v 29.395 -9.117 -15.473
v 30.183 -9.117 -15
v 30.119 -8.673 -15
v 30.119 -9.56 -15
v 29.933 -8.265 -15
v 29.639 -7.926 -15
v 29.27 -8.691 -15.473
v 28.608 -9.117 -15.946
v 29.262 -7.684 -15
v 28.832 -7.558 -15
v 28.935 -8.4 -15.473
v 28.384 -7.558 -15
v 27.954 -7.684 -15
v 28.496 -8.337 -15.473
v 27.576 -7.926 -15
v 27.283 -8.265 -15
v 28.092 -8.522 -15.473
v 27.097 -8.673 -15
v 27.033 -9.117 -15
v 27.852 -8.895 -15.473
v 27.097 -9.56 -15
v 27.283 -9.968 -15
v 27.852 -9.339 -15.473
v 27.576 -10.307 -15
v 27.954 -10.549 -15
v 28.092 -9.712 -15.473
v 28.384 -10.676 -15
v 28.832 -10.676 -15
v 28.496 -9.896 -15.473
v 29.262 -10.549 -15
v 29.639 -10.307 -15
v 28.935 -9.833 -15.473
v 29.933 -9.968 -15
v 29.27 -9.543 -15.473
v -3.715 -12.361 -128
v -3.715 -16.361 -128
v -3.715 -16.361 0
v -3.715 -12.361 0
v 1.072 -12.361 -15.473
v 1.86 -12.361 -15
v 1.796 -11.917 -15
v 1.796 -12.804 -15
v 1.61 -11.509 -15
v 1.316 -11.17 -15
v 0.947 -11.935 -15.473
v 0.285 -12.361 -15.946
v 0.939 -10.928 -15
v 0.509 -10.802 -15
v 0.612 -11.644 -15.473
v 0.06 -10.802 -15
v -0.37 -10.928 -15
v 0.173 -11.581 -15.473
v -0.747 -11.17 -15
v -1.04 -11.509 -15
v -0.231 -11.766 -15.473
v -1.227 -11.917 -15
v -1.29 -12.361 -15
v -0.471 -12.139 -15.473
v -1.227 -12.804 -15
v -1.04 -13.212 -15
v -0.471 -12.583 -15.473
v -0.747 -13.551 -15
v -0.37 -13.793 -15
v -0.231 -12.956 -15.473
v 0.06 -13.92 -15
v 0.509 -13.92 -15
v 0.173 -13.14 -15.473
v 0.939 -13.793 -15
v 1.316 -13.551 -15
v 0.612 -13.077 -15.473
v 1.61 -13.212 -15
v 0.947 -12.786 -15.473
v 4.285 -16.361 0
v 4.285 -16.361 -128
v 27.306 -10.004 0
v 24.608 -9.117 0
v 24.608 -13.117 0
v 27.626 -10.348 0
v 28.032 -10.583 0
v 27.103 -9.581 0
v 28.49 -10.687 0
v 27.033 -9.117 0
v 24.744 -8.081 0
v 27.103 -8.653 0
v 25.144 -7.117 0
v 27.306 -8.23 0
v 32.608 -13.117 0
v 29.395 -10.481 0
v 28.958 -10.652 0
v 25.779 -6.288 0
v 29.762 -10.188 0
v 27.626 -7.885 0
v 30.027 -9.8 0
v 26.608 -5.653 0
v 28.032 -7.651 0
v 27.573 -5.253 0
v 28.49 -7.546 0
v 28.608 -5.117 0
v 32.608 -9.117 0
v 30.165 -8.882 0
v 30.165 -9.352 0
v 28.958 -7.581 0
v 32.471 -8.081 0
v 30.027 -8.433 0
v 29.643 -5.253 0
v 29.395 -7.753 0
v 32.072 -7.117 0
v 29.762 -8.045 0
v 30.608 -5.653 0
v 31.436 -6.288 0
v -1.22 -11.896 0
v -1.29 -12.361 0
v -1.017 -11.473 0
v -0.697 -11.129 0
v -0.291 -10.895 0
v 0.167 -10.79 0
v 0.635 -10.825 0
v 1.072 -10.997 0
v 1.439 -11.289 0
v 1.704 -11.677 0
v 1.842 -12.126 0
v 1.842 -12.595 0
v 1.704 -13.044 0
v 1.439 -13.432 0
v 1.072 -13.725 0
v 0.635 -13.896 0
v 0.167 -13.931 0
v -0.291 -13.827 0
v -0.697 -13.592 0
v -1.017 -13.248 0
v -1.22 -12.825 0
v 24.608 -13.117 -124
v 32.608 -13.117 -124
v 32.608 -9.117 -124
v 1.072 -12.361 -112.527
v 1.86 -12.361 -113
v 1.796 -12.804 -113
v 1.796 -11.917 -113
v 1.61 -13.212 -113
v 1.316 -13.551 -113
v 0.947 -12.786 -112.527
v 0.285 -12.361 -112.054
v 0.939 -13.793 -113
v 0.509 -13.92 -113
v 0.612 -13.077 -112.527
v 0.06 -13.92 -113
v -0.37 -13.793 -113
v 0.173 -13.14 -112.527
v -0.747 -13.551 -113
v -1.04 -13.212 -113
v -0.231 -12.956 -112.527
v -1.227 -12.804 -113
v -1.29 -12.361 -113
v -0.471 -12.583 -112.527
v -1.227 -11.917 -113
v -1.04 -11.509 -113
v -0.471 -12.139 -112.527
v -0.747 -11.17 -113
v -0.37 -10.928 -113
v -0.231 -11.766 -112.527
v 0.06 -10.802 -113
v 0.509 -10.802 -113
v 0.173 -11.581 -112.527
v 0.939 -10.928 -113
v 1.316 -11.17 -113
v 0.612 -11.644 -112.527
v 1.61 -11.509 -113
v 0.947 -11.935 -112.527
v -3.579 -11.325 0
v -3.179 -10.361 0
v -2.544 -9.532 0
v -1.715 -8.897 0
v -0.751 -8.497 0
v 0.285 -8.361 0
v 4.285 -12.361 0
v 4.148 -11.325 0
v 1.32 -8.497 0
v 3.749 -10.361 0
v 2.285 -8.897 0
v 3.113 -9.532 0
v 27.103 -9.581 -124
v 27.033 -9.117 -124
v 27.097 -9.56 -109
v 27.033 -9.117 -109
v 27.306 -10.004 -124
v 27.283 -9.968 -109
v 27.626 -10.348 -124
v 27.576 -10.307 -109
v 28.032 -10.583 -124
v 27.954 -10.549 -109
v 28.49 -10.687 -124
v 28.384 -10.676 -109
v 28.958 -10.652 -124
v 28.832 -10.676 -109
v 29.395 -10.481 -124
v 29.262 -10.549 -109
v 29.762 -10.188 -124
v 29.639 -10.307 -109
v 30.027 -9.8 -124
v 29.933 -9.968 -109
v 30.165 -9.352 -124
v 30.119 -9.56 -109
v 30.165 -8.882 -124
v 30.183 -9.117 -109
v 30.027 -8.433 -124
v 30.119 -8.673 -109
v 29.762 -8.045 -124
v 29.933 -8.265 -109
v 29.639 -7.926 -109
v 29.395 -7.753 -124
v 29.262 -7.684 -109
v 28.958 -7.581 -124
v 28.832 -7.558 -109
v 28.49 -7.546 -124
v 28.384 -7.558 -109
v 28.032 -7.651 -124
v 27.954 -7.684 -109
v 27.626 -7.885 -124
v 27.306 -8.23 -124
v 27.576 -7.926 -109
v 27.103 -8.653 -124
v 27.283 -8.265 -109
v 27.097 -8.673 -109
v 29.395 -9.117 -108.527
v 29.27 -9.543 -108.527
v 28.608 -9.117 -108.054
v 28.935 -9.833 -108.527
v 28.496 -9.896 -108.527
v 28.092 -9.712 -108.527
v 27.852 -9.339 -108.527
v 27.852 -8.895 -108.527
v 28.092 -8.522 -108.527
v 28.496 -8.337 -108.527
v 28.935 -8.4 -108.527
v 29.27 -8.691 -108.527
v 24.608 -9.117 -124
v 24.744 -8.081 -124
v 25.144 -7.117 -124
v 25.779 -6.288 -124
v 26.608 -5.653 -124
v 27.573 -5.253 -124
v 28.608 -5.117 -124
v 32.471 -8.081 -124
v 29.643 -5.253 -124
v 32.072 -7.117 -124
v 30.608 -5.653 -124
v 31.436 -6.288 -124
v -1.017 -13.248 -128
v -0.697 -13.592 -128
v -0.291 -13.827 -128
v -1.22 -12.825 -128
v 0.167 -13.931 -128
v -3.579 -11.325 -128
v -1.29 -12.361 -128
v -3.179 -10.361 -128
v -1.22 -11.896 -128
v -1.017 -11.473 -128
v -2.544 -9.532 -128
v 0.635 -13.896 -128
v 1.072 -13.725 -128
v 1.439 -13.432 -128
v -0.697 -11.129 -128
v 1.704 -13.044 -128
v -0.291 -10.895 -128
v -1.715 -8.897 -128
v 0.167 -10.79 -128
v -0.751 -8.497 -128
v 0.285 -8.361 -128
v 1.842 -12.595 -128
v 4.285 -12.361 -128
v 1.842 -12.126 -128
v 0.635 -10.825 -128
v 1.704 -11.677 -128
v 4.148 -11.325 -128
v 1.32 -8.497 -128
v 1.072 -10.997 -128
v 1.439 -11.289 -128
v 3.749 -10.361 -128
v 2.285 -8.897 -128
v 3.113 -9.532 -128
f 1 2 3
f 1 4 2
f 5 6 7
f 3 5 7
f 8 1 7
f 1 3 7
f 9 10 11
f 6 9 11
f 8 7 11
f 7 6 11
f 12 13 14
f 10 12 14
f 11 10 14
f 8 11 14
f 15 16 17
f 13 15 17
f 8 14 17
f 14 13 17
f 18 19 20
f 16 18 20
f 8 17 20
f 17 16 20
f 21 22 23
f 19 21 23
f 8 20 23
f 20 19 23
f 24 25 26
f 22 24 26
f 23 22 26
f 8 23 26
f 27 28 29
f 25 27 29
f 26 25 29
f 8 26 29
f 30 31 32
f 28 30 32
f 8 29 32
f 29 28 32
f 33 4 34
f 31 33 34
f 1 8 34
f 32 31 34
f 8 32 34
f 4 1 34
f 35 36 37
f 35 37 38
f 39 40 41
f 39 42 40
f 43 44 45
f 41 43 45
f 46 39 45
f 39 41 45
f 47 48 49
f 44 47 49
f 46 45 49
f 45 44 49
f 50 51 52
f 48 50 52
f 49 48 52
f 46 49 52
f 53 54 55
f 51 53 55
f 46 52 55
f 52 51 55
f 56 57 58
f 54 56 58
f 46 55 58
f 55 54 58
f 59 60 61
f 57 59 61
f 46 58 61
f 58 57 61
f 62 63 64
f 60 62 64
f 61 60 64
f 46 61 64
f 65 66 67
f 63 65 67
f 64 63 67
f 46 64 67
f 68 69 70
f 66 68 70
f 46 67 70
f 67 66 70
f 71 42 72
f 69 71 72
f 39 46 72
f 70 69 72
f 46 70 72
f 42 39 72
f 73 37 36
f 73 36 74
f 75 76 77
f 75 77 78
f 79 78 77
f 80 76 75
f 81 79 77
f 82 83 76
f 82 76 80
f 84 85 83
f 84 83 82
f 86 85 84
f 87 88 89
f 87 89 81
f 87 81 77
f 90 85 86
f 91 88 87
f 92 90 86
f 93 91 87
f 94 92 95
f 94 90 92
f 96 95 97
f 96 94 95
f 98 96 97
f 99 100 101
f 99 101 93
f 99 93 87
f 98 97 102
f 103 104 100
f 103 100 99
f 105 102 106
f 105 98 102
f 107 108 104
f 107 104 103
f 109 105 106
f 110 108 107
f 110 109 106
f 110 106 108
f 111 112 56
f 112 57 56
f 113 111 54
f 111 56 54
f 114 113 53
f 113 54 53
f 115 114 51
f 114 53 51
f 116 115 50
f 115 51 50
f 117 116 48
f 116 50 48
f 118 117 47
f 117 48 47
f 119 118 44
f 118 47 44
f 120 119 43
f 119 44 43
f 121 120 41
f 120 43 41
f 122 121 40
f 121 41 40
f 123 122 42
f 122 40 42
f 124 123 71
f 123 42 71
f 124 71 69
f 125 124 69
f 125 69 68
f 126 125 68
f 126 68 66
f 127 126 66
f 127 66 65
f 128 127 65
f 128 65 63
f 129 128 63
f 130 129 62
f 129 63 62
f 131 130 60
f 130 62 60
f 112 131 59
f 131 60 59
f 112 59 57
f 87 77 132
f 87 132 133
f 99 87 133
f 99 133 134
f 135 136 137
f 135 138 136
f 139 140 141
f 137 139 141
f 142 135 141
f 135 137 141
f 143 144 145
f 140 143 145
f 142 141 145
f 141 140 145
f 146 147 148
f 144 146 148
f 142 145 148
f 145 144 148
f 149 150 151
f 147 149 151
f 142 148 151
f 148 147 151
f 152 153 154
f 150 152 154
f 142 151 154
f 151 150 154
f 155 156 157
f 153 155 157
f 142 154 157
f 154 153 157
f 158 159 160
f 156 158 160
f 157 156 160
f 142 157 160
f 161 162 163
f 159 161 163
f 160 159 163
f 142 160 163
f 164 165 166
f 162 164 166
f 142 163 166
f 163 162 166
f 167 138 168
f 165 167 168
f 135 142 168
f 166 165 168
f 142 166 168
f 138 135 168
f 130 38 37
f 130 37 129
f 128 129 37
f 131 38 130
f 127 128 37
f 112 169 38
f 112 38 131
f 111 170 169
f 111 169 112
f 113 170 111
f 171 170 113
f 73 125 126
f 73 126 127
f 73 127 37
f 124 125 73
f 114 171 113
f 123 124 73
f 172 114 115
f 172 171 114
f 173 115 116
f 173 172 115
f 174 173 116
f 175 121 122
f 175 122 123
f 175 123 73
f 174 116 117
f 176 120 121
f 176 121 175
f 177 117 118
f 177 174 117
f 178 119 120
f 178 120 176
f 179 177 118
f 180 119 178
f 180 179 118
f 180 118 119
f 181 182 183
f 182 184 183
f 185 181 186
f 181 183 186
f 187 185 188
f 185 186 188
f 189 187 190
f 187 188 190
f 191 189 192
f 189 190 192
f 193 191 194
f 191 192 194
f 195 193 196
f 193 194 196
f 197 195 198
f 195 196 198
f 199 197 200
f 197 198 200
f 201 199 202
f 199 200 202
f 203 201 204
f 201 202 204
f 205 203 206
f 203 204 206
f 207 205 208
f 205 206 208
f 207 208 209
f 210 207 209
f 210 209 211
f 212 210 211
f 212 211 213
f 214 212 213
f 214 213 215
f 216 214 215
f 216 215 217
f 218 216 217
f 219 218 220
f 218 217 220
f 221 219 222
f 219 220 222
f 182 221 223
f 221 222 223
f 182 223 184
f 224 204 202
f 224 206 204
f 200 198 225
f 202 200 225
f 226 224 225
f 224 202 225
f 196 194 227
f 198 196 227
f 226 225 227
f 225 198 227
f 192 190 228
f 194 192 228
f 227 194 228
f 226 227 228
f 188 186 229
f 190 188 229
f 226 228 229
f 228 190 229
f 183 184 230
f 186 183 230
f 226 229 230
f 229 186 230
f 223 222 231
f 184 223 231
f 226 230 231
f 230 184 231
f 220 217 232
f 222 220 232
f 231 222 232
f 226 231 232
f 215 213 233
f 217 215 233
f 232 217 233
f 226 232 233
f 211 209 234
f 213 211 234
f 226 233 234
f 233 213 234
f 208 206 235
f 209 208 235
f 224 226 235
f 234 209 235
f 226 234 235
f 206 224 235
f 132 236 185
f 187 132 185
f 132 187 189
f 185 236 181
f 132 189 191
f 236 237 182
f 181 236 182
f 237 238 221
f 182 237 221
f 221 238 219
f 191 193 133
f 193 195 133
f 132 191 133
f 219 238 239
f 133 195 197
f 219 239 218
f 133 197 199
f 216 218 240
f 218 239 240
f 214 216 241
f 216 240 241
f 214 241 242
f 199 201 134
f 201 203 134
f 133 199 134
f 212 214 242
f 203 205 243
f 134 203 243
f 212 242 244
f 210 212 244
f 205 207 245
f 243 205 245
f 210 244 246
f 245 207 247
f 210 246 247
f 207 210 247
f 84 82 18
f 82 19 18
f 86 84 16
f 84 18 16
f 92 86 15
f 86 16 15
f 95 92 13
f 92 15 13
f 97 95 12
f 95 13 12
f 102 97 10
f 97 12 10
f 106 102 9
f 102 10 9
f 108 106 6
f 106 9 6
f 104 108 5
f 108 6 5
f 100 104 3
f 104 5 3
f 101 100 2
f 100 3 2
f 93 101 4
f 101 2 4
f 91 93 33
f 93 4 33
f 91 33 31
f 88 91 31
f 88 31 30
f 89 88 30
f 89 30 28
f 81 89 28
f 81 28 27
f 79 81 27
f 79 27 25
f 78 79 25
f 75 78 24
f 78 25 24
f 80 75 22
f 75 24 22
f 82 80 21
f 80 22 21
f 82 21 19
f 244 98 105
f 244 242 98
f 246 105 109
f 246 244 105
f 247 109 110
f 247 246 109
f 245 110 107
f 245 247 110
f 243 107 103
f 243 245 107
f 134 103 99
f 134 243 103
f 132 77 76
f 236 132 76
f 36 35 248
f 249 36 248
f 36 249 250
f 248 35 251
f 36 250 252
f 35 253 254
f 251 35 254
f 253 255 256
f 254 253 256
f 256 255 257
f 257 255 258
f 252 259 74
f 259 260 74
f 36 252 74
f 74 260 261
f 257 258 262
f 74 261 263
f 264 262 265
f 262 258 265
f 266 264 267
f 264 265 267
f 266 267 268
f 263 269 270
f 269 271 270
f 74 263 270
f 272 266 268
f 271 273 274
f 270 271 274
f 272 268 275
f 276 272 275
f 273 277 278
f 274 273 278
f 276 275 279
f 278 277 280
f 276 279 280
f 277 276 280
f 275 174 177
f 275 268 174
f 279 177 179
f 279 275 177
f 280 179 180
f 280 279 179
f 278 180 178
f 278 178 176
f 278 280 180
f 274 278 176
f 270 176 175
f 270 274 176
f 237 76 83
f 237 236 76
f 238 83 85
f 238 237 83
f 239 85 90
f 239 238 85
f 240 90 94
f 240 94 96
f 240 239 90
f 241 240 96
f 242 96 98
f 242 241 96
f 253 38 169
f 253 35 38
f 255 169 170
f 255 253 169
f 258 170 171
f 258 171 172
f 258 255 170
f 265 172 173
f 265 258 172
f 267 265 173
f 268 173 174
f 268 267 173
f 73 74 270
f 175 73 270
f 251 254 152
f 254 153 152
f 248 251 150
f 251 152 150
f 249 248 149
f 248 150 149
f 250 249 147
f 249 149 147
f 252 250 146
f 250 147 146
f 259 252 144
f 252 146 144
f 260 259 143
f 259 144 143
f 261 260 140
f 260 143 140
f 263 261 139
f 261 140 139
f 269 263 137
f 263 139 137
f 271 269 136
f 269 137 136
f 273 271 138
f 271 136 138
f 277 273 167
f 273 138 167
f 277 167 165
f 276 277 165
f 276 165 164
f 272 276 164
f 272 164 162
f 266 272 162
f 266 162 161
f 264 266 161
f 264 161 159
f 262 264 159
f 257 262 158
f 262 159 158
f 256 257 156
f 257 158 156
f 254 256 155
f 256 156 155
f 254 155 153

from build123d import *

# Parameters (mm, degrees)
F0_W           = 8
F0_H           = 8
F1_DEPTH       = 128
F2_DEPTH       = 124
F5_D           = 3.15
F5_DEPTH       = 15
F5_TIP         = 0.946355475
F5_2_D         = 3.15
F5_2_DEPTH     = 15
F5_2_TIP       = 0.946355475
F5_ON_F3_D     = 3.15
F5_ON_F3_DEPTH = 15
F5_ON_F3_TIP   = 0.946355475
F5_ON_F4_D     = 3.15
F5_ON_F4_DEPTH = 15
F5_ON_F4_TIP   = 0.946355475
F6_R           = 3.99999
F6_2_R         = 3.99999


# Not quite as in the source:
# - a fillet or chamfer is up to 0.001 mm smaller than in the source, because OpenCascade refuses the exact size


with BuildPart() as f1:
    # F0 (on Top) → F1 (new body)
    with BuildSketch(Plane.XY):
        with Locations((0.2846295983, -12.3607183769)):
            Rectangle(F0_W, F0_H)
    extrude(amount=-F1_DEPTH)

    # F5
    with Locations(Plane.XY):
        with Locations((0.2846295983, -12.3607183769), (28.6077857018, -9.1167669743)):
            Hole(F5_D / 2, depth=F5_DEPTH)
            with Locations((0, 0, -(F5_DEPTH + F5_TIP / 2))):  # 118° drill point
                Cone(0, F5_D / 2, F5_TIP, mode=Mode.SUBTRACT)

    # F5 on F3
    with Locations(Plane(origin=(0, 0, -128), x_dir=(1, 0, 0), z_dir=(0, 0, -1))):
        with Locations((0.2846295983, 12.3607183769)):
            Hole(F5_ON_F3_D / 2, depth=F5_ON_F3_DEPTH)
            with Locations((0, 0, -(F5_ON_F3_DEPTH + F5_ON_F3_TIP / 2))):  # 118° drill point
                Cone(0, F5_ON_F3_D / 2, F5_ON_F3_TIP, mode=Mode.SUBTRACT)

    # F6 (radius 4 in the source; OpenCascade refuses exactly that, so slightly less here)
    f6_edges = [f1.edges().sort_by_distance(p)[0] for p in [
        (-3.71537, -8.360718, -64),
        (4.28463, -8.360718, -64),
    ]]
    fillet(f6_edges, radius=F6_R)


with BuildPart() as f2:
    # F0 (on Top) → F2 (new body)
    with BuildSketch(Plane.XY):
        with Locations((28.6077857018, -9.1167669743)):
            Rectangle(F0_W, F0_H)
    extrude(amount=-F2_DEPTH)

    # F5#2
    with Locations(Plane.XY):
        with Locations((0.2846295983, -12.3607183769), (28.6077857018, -9.1167669743)):
            Hole(F5_2_D / 2, depth=F5_2_DEPTH)
            with Locations((0, 0, -(F5_2_DEPTH + F5_2_TIP / 2))):  # 118° drill point
                Cone(0, F5_2_D / 2, F5_2_TIP, mode=Mode.SUBTRACT)

    # F5 on F4
    with Locations(Plane(origin=(0, 0, -124), x_dir=(1, 0, 0), z_dir=(0, 0, -1))):
        with Locations((28.6077857018, 9.1167669743)):
            Hole(F5_ON_F4_D / 2, depth=F5_ON_F4_DEPTH)
            with Locations((0, 0, -(F5_ON_F4_DEPTH + F5_ON_F4_TIP / 2))):  # 118° drill point
                Cone(0, F5_ON_F4_D / 2, F5_ON_F4_TIP, mode=Mode.SUBTRACT)

    # F6#2 (radius 4 in the source; OpenCascade refuses exactly that, so slightly less here)
    f6_2_edges = [f2.edges().sort_by_distance(p)[0] for p in [
        (24.607786, -5.116767, -62),
        (32.607786, -5.116767, -62),
    ]]
    fillet(f6_2_edges, radius=F6_2_R)


solid = Compound([f1.part, f2.part])
